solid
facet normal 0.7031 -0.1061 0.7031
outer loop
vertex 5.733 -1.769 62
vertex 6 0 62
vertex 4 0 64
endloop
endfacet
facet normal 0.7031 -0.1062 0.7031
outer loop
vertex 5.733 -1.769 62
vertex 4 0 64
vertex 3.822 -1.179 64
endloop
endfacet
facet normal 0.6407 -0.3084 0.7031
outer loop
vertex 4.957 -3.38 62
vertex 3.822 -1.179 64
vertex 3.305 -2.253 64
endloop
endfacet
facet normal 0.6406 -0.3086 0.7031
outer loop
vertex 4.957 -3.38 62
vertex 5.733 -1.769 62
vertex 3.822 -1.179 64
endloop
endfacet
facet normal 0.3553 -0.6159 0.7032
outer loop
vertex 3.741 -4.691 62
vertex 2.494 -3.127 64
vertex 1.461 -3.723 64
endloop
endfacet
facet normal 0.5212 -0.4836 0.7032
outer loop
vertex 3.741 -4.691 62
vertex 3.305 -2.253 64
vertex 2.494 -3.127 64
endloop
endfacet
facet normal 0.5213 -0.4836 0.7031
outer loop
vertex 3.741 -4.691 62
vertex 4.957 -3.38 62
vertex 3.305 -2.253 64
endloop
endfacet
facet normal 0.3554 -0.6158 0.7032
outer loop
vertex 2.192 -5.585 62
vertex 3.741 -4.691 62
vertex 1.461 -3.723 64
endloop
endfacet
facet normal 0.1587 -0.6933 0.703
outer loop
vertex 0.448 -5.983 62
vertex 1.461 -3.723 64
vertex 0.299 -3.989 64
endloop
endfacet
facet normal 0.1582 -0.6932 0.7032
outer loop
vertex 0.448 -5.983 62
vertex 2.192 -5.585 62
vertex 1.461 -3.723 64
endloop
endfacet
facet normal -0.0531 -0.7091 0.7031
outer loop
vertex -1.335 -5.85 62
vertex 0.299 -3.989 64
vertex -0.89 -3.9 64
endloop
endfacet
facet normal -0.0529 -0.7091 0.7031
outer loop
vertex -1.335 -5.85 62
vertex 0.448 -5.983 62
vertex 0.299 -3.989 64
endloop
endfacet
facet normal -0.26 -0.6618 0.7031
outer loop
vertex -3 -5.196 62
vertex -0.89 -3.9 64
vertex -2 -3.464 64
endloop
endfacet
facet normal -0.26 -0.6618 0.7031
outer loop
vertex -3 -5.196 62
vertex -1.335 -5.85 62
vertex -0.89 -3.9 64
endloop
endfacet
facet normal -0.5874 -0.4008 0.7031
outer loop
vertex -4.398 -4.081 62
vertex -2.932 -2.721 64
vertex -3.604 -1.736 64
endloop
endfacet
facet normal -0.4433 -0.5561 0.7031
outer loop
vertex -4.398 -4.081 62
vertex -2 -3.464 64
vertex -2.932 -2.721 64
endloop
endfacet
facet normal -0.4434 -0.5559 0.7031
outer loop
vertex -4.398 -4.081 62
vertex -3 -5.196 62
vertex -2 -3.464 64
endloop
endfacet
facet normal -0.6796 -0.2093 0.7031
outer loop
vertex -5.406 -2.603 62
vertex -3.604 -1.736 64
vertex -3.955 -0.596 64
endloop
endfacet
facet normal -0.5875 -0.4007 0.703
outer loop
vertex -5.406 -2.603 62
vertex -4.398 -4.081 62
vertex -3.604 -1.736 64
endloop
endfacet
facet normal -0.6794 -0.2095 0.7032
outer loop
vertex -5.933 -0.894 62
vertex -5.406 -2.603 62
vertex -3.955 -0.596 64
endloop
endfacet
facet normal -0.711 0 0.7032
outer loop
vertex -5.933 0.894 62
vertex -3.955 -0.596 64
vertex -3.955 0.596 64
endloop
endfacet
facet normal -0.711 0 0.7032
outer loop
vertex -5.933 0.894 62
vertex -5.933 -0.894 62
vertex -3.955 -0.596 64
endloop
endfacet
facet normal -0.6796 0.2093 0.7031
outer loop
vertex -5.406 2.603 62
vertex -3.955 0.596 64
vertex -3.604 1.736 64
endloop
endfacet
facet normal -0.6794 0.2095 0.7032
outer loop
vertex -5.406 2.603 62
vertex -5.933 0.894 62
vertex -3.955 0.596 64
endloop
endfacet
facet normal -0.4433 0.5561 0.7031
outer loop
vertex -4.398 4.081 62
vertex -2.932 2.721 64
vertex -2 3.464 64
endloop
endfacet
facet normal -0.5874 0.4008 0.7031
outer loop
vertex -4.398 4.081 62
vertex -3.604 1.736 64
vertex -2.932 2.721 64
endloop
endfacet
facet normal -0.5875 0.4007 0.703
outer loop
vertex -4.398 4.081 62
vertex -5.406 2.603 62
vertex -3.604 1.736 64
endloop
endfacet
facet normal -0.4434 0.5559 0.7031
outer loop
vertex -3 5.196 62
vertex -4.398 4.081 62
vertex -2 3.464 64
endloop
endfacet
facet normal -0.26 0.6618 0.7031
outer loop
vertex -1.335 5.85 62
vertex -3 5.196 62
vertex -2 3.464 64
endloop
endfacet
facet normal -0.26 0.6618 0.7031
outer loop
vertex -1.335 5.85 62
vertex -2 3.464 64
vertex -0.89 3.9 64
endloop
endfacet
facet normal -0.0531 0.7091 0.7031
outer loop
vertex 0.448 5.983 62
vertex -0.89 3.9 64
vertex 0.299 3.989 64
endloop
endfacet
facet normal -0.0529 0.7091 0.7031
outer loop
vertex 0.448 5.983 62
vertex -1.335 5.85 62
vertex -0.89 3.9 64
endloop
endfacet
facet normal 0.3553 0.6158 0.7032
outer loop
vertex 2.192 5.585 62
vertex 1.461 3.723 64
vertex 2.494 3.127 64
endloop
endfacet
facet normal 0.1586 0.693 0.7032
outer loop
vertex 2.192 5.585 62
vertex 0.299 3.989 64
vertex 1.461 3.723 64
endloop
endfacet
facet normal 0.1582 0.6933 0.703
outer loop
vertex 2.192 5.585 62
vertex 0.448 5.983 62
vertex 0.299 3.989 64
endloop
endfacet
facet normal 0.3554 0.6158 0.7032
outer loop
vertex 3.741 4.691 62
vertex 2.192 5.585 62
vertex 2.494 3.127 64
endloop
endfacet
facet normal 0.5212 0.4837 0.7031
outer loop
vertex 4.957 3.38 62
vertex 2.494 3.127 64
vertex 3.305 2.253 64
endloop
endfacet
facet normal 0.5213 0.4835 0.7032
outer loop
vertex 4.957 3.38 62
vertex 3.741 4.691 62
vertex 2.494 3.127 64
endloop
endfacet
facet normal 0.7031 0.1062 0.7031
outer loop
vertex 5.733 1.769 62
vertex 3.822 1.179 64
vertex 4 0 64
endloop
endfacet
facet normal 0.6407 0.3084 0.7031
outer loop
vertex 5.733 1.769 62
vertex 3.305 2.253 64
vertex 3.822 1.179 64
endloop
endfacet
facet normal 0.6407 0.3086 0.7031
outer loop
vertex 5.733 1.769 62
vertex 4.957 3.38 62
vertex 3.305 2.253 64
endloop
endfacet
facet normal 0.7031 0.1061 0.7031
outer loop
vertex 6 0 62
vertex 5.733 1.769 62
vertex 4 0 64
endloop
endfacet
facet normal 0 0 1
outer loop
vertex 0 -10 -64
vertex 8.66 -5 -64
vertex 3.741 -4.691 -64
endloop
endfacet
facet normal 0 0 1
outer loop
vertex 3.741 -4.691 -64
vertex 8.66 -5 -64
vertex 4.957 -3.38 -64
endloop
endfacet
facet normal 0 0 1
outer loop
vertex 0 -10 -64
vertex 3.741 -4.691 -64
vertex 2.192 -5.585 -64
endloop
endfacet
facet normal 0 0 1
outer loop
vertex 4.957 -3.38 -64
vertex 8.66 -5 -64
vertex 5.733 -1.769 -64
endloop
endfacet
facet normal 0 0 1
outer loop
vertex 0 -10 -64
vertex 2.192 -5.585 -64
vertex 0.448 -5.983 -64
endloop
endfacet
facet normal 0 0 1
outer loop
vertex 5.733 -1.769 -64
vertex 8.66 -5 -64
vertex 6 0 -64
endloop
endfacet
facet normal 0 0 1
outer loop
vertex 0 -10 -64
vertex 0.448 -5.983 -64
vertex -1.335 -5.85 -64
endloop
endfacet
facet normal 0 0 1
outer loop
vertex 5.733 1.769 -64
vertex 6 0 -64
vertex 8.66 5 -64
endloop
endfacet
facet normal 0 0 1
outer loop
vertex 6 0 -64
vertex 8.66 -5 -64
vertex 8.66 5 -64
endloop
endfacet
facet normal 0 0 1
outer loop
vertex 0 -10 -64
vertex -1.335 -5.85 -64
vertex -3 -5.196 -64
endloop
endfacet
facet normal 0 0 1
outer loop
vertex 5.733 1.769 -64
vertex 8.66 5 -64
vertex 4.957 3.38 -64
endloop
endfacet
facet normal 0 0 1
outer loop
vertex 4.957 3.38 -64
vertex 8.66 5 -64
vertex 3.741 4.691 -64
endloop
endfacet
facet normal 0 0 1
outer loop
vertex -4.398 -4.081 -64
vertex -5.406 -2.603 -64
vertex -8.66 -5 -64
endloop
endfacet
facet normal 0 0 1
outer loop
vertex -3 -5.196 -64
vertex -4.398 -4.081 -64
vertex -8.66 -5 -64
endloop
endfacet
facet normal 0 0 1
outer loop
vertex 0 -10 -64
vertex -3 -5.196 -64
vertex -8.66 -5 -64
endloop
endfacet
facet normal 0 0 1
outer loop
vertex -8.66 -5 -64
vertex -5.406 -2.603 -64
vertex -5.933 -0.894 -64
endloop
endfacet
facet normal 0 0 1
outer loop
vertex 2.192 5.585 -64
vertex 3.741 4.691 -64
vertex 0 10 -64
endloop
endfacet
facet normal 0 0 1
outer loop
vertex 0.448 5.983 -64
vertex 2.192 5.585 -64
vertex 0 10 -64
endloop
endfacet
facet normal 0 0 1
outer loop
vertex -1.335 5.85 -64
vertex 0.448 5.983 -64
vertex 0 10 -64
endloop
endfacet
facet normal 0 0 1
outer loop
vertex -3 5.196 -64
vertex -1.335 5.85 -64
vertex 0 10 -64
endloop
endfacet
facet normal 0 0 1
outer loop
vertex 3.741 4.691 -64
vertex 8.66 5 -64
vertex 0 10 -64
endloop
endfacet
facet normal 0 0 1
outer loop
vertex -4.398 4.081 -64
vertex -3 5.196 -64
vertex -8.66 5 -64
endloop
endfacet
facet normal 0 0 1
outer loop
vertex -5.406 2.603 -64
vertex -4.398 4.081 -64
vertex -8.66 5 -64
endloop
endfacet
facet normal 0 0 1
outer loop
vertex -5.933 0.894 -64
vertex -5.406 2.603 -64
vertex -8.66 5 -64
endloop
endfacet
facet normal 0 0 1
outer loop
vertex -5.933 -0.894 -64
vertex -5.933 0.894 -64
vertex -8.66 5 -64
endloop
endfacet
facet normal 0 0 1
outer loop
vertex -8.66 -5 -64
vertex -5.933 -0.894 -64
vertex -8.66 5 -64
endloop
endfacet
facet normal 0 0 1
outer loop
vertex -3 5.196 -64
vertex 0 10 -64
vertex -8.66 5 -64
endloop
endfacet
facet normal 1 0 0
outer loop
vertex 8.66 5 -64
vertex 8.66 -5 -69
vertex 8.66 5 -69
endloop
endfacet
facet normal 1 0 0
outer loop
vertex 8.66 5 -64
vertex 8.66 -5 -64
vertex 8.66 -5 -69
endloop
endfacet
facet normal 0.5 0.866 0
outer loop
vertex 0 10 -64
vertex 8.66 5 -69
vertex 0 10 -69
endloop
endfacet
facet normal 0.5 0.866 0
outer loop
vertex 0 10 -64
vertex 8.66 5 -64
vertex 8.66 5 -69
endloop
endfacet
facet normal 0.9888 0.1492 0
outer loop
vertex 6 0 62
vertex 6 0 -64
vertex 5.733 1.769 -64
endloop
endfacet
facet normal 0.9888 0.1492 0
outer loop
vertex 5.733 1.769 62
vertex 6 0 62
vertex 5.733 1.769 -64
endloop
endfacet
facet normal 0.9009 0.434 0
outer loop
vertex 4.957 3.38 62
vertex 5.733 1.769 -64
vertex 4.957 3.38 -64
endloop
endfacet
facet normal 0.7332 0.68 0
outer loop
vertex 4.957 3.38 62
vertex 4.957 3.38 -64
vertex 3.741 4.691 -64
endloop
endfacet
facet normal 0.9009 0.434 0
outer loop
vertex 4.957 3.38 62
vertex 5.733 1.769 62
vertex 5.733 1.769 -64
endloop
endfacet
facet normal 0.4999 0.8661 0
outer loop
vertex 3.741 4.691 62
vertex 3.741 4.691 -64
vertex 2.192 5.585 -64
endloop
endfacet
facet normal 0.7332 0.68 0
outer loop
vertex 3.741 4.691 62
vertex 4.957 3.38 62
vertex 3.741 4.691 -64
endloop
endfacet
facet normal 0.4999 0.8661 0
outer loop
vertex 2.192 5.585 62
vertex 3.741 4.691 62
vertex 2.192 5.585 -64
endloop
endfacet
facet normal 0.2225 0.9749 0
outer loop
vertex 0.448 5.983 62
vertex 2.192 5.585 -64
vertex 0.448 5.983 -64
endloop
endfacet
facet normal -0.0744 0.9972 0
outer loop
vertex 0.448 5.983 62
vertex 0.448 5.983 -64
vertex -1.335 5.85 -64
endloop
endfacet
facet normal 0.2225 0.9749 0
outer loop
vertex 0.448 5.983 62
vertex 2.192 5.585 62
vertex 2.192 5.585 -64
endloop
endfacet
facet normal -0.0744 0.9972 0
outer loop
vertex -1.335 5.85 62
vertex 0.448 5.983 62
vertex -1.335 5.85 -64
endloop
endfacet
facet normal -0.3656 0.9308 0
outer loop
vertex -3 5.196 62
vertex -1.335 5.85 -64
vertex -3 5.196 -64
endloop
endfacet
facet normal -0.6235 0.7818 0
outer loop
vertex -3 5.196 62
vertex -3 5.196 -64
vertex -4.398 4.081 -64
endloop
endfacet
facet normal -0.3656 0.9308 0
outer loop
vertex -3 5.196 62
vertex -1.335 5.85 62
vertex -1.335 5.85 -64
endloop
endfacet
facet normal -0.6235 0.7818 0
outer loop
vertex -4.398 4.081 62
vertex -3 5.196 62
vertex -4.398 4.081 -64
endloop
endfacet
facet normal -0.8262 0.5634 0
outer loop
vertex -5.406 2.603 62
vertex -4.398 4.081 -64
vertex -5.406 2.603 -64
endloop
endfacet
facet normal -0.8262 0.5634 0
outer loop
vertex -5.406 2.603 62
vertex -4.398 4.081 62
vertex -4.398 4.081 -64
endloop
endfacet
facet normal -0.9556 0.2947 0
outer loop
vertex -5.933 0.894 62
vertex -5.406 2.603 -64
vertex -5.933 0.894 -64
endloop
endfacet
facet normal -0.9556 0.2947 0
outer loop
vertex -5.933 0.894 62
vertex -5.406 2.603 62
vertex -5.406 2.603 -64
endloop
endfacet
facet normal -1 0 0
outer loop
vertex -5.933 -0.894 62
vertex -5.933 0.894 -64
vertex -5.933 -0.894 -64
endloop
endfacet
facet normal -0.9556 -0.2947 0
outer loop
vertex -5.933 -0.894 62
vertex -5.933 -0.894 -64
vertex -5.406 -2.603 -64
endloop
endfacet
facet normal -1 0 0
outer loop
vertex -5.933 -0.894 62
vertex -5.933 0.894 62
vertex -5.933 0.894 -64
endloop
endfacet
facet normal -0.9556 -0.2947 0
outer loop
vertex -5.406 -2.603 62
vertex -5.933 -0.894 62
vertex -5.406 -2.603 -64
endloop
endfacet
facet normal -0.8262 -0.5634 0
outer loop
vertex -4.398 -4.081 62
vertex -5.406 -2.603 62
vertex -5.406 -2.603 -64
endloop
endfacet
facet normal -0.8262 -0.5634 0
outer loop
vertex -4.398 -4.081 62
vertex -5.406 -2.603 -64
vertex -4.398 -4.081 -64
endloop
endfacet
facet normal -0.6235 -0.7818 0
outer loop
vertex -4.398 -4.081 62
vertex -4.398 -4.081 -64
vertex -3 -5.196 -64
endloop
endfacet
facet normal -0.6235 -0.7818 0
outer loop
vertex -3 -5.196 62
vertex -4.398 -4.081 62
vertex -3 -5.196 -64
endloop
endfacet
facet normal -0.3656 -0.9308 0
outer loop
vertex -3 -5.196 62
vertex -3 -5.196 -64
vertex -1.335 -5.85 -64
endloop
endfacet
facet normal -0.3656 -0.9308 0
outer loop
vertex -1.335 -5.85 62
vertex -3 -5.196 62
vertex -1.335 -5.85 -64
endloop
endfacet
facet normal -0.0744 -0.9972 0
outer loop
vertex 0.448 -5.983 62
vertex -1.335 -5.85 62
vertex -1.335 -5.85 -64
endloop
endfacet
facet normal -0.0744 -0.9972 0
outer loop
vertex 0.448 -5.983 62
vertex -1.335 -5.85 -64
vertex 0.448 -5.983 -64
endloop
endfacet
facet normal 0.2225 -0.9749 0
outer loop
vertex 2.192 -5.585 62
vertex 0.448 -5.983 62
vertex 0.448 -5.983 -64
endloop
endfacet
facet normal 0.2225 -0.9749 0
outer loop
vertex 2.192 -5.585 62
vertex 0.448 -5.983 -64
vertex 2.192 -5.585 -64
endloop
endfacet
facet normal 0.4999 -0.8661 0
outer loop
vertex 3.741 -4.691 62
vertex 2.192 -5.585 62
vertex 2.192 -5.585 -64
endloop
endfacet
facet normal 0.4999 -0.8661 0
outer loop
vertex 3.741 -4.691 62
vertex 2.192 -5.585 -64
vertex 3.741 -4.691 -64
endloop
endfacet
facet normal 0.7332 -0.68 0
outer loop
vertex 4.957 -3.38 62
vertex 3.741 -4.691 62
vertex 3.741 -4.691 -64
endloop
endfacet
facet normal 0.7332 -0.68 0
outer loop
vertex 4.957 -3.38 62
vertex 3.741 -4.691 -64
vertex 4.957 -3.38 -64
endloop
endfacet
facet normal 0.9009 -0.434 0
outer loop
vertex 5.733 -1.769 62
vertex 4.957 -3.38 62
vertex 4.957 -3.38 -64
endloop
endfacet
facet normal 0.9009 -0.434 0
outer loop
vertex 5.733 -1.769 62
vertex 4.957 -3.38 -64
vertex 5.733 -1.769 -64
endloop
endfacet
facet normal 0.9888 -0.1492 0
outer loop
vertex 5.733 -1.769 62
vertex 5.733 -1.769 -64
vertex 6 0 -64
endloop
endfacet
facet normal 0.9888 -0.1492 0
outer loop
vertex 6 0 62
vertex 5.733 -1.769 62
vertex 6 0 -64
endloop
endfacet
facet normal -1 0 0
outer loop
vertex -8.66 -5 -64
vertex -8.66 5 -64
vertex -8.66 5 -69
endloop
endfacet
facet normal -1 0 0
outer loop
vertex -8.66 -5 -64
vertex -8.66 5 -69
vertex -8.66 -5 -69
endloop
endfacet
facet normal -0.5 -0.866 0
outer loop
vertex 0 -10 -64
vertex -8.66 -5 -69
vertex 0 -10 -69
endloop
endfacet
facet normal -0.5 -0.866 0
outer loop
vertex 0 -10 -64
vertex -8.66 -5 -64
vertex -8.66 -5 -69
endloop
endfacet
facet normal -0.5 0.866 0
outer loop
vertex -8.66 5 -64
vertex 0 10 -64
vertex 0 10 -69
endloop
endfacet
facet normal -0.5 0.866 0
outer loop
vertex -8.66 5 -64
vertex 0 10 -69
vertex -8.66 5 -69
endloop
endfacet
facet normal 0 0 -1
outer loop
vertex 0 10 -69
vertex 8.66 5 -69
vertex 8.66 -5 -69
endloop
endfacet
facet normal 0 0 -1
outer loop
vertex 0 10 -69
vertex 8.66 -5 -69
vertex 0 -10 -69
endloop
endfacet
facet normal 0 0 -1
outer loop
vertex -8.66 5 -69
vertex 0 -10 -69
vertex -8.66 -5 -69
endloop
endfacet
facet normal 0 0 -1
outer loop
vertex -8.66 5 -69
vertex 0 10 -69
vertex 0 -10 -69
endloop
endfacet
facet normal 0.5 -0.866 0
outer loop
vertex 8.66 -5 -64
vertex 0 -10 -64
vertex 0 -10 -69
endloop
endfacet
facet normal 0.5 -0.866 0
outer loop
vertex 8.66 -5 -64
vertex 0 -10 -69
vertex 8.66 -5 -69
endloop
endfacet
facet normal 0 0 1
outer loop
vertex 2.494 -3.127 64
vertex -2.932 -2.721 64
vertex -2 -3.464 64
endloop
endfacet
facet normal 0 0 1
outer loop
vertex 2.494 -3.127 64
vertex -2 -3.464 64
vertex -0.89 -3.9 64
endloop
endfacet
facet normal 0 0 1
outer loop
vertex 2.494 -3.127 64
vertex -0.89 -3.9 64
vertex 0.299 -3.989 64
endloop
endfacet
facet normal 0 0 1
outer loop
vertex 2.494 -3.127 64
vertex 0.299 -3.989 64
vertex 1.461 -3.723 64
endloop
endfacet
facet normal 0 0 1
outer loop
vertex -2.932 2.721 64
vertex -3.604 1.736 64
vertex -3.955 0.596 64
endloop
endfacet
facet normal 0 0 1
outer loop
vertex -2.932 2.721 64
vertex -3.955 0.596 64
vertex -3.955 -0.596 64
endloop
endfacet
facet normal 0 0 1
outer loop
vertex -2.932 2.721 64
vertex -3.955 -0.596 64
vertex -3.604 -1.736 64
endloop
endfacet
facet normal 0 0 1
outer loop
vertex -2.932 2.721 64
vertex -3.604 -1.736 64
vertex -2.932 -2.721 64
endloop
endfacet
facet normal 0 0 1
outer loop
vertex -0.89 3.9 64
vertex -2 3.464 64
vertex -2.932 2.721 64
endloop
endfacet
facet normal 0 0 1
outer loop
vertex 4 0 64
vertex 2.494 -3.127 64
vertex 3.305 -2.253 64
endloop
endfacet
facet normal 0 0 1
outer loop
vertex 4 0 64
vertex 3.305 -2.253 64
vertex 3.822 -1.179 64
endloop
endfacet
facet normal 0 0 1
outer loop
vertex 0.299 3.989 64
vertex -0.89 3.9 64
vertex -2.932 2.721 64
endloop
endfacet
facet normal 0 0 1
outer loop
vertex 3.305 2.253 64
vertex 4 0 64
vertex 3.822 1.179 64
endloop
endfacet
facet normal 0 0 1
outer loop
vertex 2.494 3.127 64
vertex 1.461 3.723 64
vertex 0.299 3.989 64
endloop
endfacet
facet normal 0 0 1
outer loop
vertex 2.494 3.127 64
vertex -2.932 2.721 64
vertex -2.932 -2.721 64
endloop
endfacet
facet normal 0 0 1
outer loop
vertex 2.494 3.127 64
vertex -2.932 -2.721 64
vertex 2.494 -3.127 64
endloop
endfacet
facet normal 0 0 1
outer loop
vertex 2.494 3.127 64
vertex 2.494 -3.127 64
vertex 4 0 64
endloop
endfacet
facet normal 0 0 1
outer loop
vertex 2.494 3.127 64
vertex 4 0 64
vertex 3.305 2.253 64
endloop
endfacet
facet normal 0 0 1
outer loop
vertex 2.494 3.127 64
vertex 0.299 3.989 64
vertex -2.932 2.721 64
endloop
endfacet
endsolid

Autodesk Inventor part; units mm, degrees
sketch "Sketch1" plane through (0, 0, 0) normal (0, 0, 1) x (1, 0, 0)
  circle A0 centre (0, 0) radius 6
  dimension "d0" = 12
extrude "Extrusion1" add sketch "Sketch1" along normal mid plane 128
sketch "Sketch2" plane through (0, 0, -64) normal (0, 0, -1) x (-1, 0, 0)
  line L0 (0, 10) -> (8.6603, 5)
  line L1 (8.6603, 5) -> (8.6603, -5)
  line L2 (8.6603, -5) -> (0, -10)
  line L3 (0, -10) -> (-8.6603, -5)
  line L4 (-8.6603, -5) -> (-8.6603, 5)
  line L5 (-8.6603, 5) -> (0, 10)
  point P0 (0, 0)
  point P1 (0, 0)
  dimension "d3" = 10
extrude "Extrusion2" add sketch "Sketch2" along normal blind 5
thread "Thread1" size "M12x1.25" class "6g" standard "ANSI Metric M Profile" full length
chamfer "Chamfer1" distance 2 angle 45 1 edges at (-6, 0, 64)
